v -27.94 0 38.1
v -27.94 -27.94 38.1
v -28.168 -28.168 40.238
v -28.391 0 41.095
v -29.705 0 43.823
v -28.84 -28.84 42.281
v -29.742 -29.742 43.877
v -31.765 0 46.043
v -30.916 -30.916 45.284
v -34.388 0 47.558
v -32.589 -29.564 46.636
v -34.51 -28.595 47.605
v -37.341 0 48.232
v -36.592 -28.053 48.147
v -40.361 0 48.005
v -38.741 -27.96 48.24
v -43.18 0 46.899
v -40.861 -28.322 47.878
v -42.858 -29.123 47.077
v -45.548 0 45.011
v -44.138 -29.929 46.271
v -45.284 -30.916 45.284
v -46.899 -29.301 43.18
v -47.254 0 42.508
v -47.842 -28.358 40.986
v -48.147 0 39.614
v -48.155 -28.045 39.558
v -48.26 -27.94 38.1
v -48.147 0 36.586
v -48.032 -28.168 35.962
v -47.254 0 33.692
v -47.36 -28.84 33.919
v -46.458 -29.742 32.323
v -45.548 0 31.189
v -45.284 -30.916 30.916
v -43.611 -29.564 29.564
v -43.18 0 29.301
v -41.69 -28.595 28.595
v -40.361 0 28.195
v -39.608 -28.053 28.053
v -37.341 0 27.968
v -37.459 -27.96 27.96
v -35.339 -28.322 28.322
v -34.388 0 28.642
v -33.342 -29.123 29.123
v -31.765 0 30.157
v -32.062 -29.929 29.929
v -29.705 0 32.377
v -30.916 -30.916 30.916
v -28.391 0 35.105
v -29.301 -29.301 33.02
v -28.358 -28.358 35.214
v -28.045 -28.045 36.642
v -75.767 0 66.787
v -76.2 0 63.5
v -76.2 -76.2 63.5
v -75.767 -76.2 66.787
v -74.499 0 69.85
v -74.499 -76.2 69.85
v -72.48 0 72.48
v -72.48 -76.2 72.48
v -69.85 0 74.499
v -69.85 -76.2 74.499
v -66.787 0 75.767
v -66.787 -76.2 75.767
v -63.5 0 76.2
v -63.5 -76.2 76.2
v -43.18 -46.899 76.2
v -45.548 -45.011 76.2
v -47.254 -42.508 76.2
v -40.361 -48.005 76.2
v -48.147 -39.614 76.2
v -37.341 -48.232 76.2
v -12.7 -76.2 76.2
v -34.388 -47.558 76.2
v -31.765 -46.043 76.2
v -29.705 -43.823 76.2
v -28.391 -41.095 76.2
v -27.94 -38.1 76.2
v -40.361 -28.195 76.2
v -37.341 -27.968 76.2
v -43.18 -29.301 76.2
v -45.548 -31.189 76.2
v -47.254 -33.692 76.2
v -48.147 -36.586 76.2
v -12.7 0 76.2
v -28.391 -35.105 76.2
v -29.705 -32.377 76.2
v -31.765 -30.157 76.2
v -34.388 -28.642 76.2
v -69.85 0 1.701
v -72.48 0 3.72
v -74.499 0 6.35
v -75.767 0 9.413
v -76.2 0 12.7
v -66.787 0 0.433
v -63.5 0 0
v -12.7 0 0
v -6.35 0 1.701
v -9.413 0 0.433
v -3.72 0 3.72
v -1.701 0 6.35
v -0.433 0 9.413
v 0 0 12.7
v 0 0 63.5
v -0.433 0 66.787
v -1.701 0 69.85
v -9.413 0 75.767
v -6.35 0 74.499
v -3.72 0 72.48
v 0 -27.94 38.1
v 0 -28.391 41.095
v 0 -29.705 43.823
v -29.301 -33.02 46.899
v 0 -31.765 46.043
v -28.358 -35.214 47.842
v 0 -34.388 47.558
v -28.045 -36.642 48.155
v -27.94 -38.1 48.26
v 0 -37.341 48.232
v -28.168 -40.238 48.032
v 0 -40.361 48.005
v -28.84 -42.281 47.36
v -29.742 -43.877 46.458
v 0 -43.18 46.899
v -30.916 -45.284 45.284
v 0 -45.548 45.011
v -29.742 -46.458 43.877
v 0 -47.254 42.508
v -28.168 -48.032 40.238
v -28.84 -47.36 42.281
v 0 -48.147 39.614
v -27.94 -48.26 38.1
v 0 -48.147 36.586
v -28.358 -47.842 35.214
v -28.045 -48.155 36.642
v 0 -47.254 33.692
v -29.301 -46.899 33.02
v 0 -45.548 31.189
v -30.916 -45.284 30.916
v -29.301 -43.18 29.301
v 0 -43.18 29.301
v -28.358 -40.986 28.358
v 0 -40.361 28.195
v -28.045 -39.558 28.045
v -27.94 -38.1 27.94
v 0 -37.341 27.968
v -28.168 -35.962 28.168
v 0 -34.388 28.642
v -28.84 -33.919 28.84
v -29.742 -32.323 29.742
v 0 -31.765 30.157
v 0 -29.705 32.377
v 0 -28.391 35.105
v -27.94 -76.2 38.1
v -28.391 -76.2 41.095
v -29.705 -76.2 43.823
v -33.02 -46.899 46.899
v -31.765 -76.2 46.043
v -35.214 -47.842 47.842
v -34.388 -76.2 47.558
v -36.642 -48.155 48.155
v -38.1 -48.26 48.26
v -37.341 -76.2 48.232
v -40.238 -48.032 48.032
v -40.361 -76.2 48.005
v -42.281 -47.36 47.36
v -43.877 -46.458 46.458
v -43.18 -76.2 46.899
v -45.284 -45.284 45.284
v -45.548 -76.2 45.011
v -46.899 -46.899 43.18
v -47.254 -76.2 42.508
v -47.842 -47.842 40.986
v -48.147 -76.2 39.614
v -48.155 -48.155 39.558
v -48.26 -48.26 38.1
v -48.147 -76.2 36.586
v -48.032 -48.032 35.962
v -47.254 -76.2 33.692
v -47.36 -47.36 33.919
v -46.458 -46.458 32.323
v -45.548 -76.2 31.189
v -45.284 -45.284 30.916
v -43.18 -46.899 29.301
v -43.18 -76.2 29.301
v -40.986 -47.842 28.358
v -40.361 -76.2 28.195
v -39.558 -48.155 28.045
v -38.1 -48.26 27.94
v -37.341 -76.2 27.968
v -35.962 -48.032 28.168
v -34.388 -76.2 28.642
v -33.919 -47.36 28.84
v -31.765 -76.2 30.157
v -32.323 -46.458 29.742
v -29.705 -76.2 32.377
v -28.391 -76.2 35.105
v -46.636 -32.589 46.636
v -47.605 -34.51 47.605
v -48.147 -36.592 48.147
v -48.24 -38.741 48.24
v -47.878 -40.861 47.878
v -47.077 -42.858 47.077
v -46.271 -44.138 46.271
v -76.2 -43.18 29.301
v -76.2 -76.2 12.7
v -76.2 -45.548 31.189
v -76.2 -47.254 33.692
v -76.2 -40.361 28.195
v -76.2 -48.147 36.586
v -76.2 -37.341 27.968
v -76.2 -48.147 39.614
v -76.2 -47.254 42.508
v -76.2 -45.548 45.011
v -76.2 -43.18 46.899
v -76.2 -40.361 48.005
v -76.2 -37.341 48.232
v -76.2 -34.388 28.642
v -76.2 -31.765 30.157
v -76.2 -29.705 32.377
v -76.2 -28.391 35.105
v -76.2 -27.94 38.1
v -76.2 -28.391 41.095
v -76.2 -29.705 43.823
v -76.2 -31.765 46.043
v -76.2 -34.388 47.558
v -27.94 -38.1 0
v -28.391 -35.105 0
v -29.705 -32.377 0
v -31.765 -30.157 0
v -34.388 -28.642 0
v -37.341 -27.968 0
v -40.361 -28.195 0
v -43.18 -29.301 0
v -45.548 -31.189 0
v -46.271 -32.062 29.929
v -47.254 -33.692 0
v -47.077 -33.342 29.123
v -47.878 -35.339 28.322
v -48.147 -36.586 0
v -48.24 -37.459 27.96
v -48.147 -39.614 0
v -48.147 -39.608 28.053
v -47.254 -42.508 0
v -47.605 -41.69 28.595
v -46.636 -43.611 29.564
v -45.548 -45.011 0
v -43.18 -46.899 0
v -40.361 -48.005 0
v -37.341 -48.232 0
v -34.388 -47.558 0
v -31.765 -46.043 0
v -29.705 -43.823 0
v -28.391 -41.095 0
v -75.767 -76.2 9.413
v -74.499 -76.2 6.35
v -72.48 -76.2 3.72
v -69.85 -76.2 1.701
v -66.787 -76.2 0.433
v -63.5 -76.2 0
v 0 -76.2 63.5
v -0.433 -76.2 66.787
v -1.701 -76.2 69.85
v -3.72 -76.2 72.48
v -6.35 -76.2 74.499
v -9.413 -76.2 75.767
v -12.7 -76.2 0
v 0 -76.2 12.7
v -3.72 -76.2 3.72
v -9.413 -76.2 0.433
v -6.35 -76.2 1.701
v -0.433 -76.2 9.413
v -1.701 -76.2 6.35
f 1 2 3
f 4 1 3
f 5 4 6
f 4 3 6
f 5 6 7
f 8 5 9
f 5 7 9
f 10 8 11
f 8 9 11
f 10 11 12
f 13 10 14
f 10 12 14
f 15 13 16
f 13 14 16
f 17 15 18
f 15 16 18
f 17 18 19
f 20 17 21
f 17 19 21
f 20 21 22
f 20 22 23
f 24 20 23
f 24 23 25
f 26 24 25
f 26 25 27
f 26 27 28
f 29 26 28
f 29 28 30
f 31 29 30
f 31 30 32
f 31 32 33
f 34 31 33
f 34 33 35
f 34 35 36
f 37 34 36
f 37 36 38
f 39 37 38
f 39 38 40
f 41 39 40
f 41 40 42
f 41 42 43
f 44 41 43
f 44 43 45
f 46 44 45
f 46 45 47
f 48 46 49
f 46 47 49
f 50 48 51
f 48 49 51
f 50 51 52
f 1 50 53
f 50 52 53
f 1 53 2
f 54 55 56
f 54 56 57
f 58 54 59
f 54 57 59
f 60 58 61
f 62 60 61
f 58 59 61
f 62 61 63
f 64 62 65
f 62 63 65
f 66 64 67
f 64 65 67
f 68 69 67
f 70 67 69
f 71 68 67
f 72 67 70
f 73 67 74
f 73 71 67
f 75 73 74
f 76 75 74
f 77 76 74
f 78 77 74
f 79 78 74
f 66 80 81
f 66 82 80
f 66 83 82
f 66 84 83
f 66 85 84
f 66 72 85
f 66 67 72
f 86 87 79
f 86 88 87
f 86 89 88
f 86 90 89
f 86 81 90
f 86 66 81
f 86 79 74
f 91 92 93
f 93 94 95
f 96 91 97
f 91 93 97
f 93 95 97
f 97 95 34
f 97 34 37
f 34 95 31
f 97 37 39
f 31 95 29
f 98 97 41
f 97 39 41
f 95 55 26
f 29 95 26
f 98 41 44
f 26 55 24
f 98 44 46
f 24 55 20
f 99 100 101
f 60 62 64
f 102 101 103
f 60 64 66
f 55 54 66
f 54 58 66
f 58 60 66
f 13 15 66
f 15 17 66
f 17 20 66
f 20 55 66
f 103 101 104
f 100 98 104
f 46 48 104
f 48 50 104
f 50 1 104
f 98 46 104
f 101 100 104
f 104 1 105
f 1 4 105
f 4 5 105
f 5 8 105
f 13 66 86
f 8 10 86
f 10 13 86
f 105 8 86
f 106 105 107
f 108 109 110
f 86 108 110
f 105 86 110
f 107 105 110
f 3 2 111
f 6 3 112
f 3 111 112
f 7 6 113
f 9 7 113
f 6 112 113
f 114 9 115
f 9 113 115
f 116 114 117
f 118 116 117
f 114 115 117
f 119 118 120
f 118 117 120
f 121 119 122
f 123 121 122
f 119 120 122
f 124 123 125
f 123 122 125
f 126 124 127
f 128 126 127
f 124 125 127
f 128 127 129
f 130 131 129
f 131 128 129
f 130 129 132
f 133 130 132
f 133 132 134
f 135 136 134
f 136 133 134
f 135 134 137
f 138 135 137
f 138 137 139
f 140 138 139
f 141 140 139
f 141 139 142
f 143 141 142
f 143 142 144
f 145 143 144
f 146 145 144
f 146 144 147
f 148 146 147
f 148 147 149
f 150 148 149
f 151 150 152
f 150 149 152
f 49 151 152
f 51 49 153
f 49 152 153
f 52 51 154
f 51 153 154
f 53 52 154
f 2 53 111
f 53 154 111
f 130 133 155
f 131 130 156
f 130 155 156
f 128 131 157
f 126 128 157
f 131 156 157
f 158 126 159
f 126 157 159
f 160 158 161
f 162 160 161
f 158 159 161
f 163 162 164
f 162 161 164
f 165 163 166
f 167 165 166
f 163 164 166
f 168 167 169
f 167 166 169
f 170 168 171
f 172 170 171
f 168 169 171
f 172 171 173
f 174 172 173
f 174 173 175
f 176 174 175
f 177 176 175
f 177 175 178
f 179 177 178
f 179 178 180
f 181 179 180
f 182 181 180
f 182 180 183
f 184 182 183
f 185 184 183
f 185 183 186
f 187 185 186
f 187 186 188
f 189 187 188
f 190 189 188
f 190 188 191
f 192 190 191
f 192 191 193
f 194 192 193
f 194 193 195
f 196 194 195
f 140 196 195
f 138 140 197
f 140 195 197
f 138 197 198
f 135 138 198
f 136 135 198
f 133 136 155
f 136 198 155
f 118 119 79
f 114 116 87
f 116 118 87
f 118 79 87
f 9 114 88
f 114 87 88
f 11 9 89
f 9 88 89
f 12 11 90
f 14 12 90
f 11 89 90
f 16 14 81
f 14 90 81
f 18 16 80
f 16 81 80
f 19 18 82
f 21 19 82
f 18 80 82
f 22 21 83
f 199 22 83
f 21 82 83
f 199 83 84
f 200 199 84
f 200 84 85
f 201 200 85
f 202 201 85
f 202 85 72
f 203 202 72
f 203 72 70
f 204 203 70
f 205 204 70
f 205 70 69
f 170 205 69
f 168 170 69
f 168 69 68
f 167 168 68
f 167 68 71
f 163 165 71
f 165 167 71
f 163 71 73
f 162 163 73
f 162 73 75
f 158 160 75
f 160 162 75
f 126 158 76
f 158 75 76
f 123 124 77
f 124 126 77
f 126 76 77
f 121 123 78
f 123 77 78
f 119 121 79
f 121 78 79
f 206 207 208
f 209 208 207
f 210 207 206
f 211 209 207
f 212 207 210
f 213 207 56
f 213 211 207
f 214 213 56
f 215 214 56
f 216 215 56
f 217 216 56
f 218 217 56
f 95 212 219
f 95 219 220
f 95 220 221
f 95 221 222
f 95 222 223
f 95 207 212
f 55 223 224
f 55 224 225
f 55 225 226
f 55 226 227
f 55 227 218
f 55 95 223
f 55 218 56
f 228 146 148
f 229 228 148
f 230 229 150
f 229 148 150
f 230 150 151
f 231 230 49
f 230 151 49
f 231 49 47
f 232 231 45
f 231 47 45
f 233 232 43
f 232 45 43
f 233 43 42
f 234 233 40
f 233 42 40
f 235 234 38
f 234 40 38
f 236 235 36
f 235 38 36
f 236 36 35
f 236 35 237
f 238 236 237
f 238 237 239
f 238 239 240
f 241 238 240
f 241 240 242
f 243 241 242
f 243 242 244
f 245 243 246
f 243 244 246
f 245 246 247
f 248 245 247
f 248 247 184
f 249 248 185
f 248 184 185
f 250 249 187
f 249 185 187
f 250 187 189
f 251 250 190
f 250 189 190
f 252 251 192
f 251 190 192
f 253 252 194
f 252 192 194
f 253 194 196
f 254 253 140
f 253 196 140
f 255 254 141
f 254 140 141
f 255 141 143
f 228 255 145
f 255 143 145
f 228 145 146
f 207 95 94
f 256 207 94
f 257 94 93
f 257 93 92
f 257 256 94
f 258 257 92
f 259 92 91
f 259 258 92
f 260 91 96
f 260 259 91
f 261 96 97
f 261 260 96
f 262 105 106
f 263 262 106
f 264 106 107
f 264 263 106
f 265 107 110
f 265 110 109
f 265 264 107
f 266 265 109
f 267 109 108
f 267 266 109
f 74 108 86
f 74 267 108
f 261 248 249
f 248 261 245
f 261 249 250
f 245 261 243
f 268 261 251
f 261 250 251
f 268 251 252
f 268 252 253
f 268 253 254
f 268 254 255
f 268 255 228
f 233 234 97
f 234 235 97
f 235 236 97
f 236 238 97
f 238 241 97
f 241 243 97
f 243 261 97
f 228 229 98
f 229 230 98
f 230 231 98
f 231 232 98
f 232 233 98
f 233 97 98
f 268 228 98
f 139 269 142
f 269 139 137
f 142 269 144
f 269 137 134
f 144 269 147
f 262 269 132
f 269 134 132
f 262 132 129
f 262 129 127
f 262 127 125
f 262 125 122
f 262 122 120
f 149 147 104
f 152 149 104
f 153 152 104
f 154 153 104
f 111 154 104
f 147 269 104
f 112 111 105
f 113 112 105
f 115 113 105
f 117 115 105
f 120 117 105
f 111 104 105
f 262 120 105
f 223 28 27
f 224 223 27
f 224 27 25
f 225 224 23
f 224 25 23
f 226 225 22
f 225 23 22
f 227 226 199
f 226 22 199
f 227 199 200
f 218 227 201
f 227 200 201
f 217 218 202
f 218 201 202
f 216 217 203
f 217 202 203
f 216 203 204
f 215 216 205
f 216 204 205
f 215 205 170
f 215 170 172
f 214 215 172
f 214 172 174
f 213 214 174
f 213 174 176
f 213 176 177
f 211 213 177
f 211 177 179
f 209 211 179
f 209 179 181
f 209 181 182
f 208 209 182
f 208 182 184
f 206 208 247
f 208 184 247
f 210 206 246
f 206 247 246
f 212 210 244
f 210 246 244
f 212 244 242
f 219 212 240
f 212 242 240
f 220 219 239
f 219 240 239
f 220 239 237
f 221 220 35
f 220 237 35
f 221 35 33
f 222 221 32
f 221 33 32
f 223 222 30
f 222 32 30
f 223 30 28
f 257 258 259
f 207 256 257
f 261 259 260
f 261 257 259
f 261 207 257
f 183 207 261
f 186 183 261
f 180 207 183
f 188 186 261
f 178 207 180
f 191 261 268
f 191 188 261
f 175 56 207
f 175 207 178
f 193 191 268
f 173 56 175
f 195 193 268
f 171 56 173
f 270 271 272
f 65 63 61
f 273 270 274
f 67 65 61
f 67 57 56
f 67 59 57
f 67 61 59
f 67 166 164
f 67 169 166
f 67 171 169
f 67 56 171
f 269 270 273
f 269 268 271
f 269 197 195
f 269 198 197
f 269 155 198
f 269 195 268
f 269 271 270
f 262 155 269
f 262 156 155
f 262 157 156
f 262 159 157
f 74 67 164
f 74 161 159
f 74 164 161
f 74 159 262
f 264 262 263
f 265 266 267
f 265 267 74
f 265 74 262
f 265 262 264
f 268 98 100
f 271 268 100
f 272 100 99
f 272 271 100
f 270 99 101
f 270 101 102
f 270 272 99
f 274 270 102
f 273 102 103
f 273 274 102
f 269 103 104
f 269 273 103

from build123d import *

# Parameters (mm, degrees)
F0_W     = 76.2
F0_H     = 76.2
F1_DEPTH = 76.2
F2_R     = 12.7
F3_R     = 10.16
F4_DEPTH = 76.201
F5_R     = 10.16
F6_DEPTH = 76.201
F7_R     = 10.16
F8_DEPTH = 76.201


with BuildPart() as f1:
    # F0 (on Front) → F1 (new body)
    with BuildSketch(Plane.XZ):
        with Locations((-38.1, 38.1)):
            Rectangle(F0_W, F0_H)
    extrude(amount=F1_DEPTH)

    # F2
    f2_edges = [f1.edges().sort_by_distance(p)[0] for p in [
        (0, -38.1, 76.2),
        (-76.2, -38.1, 76.2),
        (0, -38.1, 0),
        (-76.2, -38.1, 0),
    ]]
    fillet(f2_edges, radius=F2_R)

    # F3 (on face) → F4 (cut, through all)
    with BuildSketch(Plane.XZ.offset(76.2)):
        with Locations((-38.1, 38.1)):
            Circle(F3_R)
    extrude(amount=-F4_DEPTH, mode=Mode.SUBTRACT)

    # F5 (on face) → F6 (cut, through all)
    with BuildSketch(Plane.YZ):
        with Locations((-38.1, 38.1)):
            Circle(F5_R)
    extrude(amount=-F6_DEPTH, mode=Mode.SUBTRACT)

    # F7 (on face) → F8 (cut, through all)
    with BuildSketch(Plane.XY.offset(76.2)):
        with Locations((-38.1, -38.1)):
            Circle(F7_R)
    extrude(amount=-F8_DEPTH, mode=Mode.SUBTRACT)


solid = f1.part
